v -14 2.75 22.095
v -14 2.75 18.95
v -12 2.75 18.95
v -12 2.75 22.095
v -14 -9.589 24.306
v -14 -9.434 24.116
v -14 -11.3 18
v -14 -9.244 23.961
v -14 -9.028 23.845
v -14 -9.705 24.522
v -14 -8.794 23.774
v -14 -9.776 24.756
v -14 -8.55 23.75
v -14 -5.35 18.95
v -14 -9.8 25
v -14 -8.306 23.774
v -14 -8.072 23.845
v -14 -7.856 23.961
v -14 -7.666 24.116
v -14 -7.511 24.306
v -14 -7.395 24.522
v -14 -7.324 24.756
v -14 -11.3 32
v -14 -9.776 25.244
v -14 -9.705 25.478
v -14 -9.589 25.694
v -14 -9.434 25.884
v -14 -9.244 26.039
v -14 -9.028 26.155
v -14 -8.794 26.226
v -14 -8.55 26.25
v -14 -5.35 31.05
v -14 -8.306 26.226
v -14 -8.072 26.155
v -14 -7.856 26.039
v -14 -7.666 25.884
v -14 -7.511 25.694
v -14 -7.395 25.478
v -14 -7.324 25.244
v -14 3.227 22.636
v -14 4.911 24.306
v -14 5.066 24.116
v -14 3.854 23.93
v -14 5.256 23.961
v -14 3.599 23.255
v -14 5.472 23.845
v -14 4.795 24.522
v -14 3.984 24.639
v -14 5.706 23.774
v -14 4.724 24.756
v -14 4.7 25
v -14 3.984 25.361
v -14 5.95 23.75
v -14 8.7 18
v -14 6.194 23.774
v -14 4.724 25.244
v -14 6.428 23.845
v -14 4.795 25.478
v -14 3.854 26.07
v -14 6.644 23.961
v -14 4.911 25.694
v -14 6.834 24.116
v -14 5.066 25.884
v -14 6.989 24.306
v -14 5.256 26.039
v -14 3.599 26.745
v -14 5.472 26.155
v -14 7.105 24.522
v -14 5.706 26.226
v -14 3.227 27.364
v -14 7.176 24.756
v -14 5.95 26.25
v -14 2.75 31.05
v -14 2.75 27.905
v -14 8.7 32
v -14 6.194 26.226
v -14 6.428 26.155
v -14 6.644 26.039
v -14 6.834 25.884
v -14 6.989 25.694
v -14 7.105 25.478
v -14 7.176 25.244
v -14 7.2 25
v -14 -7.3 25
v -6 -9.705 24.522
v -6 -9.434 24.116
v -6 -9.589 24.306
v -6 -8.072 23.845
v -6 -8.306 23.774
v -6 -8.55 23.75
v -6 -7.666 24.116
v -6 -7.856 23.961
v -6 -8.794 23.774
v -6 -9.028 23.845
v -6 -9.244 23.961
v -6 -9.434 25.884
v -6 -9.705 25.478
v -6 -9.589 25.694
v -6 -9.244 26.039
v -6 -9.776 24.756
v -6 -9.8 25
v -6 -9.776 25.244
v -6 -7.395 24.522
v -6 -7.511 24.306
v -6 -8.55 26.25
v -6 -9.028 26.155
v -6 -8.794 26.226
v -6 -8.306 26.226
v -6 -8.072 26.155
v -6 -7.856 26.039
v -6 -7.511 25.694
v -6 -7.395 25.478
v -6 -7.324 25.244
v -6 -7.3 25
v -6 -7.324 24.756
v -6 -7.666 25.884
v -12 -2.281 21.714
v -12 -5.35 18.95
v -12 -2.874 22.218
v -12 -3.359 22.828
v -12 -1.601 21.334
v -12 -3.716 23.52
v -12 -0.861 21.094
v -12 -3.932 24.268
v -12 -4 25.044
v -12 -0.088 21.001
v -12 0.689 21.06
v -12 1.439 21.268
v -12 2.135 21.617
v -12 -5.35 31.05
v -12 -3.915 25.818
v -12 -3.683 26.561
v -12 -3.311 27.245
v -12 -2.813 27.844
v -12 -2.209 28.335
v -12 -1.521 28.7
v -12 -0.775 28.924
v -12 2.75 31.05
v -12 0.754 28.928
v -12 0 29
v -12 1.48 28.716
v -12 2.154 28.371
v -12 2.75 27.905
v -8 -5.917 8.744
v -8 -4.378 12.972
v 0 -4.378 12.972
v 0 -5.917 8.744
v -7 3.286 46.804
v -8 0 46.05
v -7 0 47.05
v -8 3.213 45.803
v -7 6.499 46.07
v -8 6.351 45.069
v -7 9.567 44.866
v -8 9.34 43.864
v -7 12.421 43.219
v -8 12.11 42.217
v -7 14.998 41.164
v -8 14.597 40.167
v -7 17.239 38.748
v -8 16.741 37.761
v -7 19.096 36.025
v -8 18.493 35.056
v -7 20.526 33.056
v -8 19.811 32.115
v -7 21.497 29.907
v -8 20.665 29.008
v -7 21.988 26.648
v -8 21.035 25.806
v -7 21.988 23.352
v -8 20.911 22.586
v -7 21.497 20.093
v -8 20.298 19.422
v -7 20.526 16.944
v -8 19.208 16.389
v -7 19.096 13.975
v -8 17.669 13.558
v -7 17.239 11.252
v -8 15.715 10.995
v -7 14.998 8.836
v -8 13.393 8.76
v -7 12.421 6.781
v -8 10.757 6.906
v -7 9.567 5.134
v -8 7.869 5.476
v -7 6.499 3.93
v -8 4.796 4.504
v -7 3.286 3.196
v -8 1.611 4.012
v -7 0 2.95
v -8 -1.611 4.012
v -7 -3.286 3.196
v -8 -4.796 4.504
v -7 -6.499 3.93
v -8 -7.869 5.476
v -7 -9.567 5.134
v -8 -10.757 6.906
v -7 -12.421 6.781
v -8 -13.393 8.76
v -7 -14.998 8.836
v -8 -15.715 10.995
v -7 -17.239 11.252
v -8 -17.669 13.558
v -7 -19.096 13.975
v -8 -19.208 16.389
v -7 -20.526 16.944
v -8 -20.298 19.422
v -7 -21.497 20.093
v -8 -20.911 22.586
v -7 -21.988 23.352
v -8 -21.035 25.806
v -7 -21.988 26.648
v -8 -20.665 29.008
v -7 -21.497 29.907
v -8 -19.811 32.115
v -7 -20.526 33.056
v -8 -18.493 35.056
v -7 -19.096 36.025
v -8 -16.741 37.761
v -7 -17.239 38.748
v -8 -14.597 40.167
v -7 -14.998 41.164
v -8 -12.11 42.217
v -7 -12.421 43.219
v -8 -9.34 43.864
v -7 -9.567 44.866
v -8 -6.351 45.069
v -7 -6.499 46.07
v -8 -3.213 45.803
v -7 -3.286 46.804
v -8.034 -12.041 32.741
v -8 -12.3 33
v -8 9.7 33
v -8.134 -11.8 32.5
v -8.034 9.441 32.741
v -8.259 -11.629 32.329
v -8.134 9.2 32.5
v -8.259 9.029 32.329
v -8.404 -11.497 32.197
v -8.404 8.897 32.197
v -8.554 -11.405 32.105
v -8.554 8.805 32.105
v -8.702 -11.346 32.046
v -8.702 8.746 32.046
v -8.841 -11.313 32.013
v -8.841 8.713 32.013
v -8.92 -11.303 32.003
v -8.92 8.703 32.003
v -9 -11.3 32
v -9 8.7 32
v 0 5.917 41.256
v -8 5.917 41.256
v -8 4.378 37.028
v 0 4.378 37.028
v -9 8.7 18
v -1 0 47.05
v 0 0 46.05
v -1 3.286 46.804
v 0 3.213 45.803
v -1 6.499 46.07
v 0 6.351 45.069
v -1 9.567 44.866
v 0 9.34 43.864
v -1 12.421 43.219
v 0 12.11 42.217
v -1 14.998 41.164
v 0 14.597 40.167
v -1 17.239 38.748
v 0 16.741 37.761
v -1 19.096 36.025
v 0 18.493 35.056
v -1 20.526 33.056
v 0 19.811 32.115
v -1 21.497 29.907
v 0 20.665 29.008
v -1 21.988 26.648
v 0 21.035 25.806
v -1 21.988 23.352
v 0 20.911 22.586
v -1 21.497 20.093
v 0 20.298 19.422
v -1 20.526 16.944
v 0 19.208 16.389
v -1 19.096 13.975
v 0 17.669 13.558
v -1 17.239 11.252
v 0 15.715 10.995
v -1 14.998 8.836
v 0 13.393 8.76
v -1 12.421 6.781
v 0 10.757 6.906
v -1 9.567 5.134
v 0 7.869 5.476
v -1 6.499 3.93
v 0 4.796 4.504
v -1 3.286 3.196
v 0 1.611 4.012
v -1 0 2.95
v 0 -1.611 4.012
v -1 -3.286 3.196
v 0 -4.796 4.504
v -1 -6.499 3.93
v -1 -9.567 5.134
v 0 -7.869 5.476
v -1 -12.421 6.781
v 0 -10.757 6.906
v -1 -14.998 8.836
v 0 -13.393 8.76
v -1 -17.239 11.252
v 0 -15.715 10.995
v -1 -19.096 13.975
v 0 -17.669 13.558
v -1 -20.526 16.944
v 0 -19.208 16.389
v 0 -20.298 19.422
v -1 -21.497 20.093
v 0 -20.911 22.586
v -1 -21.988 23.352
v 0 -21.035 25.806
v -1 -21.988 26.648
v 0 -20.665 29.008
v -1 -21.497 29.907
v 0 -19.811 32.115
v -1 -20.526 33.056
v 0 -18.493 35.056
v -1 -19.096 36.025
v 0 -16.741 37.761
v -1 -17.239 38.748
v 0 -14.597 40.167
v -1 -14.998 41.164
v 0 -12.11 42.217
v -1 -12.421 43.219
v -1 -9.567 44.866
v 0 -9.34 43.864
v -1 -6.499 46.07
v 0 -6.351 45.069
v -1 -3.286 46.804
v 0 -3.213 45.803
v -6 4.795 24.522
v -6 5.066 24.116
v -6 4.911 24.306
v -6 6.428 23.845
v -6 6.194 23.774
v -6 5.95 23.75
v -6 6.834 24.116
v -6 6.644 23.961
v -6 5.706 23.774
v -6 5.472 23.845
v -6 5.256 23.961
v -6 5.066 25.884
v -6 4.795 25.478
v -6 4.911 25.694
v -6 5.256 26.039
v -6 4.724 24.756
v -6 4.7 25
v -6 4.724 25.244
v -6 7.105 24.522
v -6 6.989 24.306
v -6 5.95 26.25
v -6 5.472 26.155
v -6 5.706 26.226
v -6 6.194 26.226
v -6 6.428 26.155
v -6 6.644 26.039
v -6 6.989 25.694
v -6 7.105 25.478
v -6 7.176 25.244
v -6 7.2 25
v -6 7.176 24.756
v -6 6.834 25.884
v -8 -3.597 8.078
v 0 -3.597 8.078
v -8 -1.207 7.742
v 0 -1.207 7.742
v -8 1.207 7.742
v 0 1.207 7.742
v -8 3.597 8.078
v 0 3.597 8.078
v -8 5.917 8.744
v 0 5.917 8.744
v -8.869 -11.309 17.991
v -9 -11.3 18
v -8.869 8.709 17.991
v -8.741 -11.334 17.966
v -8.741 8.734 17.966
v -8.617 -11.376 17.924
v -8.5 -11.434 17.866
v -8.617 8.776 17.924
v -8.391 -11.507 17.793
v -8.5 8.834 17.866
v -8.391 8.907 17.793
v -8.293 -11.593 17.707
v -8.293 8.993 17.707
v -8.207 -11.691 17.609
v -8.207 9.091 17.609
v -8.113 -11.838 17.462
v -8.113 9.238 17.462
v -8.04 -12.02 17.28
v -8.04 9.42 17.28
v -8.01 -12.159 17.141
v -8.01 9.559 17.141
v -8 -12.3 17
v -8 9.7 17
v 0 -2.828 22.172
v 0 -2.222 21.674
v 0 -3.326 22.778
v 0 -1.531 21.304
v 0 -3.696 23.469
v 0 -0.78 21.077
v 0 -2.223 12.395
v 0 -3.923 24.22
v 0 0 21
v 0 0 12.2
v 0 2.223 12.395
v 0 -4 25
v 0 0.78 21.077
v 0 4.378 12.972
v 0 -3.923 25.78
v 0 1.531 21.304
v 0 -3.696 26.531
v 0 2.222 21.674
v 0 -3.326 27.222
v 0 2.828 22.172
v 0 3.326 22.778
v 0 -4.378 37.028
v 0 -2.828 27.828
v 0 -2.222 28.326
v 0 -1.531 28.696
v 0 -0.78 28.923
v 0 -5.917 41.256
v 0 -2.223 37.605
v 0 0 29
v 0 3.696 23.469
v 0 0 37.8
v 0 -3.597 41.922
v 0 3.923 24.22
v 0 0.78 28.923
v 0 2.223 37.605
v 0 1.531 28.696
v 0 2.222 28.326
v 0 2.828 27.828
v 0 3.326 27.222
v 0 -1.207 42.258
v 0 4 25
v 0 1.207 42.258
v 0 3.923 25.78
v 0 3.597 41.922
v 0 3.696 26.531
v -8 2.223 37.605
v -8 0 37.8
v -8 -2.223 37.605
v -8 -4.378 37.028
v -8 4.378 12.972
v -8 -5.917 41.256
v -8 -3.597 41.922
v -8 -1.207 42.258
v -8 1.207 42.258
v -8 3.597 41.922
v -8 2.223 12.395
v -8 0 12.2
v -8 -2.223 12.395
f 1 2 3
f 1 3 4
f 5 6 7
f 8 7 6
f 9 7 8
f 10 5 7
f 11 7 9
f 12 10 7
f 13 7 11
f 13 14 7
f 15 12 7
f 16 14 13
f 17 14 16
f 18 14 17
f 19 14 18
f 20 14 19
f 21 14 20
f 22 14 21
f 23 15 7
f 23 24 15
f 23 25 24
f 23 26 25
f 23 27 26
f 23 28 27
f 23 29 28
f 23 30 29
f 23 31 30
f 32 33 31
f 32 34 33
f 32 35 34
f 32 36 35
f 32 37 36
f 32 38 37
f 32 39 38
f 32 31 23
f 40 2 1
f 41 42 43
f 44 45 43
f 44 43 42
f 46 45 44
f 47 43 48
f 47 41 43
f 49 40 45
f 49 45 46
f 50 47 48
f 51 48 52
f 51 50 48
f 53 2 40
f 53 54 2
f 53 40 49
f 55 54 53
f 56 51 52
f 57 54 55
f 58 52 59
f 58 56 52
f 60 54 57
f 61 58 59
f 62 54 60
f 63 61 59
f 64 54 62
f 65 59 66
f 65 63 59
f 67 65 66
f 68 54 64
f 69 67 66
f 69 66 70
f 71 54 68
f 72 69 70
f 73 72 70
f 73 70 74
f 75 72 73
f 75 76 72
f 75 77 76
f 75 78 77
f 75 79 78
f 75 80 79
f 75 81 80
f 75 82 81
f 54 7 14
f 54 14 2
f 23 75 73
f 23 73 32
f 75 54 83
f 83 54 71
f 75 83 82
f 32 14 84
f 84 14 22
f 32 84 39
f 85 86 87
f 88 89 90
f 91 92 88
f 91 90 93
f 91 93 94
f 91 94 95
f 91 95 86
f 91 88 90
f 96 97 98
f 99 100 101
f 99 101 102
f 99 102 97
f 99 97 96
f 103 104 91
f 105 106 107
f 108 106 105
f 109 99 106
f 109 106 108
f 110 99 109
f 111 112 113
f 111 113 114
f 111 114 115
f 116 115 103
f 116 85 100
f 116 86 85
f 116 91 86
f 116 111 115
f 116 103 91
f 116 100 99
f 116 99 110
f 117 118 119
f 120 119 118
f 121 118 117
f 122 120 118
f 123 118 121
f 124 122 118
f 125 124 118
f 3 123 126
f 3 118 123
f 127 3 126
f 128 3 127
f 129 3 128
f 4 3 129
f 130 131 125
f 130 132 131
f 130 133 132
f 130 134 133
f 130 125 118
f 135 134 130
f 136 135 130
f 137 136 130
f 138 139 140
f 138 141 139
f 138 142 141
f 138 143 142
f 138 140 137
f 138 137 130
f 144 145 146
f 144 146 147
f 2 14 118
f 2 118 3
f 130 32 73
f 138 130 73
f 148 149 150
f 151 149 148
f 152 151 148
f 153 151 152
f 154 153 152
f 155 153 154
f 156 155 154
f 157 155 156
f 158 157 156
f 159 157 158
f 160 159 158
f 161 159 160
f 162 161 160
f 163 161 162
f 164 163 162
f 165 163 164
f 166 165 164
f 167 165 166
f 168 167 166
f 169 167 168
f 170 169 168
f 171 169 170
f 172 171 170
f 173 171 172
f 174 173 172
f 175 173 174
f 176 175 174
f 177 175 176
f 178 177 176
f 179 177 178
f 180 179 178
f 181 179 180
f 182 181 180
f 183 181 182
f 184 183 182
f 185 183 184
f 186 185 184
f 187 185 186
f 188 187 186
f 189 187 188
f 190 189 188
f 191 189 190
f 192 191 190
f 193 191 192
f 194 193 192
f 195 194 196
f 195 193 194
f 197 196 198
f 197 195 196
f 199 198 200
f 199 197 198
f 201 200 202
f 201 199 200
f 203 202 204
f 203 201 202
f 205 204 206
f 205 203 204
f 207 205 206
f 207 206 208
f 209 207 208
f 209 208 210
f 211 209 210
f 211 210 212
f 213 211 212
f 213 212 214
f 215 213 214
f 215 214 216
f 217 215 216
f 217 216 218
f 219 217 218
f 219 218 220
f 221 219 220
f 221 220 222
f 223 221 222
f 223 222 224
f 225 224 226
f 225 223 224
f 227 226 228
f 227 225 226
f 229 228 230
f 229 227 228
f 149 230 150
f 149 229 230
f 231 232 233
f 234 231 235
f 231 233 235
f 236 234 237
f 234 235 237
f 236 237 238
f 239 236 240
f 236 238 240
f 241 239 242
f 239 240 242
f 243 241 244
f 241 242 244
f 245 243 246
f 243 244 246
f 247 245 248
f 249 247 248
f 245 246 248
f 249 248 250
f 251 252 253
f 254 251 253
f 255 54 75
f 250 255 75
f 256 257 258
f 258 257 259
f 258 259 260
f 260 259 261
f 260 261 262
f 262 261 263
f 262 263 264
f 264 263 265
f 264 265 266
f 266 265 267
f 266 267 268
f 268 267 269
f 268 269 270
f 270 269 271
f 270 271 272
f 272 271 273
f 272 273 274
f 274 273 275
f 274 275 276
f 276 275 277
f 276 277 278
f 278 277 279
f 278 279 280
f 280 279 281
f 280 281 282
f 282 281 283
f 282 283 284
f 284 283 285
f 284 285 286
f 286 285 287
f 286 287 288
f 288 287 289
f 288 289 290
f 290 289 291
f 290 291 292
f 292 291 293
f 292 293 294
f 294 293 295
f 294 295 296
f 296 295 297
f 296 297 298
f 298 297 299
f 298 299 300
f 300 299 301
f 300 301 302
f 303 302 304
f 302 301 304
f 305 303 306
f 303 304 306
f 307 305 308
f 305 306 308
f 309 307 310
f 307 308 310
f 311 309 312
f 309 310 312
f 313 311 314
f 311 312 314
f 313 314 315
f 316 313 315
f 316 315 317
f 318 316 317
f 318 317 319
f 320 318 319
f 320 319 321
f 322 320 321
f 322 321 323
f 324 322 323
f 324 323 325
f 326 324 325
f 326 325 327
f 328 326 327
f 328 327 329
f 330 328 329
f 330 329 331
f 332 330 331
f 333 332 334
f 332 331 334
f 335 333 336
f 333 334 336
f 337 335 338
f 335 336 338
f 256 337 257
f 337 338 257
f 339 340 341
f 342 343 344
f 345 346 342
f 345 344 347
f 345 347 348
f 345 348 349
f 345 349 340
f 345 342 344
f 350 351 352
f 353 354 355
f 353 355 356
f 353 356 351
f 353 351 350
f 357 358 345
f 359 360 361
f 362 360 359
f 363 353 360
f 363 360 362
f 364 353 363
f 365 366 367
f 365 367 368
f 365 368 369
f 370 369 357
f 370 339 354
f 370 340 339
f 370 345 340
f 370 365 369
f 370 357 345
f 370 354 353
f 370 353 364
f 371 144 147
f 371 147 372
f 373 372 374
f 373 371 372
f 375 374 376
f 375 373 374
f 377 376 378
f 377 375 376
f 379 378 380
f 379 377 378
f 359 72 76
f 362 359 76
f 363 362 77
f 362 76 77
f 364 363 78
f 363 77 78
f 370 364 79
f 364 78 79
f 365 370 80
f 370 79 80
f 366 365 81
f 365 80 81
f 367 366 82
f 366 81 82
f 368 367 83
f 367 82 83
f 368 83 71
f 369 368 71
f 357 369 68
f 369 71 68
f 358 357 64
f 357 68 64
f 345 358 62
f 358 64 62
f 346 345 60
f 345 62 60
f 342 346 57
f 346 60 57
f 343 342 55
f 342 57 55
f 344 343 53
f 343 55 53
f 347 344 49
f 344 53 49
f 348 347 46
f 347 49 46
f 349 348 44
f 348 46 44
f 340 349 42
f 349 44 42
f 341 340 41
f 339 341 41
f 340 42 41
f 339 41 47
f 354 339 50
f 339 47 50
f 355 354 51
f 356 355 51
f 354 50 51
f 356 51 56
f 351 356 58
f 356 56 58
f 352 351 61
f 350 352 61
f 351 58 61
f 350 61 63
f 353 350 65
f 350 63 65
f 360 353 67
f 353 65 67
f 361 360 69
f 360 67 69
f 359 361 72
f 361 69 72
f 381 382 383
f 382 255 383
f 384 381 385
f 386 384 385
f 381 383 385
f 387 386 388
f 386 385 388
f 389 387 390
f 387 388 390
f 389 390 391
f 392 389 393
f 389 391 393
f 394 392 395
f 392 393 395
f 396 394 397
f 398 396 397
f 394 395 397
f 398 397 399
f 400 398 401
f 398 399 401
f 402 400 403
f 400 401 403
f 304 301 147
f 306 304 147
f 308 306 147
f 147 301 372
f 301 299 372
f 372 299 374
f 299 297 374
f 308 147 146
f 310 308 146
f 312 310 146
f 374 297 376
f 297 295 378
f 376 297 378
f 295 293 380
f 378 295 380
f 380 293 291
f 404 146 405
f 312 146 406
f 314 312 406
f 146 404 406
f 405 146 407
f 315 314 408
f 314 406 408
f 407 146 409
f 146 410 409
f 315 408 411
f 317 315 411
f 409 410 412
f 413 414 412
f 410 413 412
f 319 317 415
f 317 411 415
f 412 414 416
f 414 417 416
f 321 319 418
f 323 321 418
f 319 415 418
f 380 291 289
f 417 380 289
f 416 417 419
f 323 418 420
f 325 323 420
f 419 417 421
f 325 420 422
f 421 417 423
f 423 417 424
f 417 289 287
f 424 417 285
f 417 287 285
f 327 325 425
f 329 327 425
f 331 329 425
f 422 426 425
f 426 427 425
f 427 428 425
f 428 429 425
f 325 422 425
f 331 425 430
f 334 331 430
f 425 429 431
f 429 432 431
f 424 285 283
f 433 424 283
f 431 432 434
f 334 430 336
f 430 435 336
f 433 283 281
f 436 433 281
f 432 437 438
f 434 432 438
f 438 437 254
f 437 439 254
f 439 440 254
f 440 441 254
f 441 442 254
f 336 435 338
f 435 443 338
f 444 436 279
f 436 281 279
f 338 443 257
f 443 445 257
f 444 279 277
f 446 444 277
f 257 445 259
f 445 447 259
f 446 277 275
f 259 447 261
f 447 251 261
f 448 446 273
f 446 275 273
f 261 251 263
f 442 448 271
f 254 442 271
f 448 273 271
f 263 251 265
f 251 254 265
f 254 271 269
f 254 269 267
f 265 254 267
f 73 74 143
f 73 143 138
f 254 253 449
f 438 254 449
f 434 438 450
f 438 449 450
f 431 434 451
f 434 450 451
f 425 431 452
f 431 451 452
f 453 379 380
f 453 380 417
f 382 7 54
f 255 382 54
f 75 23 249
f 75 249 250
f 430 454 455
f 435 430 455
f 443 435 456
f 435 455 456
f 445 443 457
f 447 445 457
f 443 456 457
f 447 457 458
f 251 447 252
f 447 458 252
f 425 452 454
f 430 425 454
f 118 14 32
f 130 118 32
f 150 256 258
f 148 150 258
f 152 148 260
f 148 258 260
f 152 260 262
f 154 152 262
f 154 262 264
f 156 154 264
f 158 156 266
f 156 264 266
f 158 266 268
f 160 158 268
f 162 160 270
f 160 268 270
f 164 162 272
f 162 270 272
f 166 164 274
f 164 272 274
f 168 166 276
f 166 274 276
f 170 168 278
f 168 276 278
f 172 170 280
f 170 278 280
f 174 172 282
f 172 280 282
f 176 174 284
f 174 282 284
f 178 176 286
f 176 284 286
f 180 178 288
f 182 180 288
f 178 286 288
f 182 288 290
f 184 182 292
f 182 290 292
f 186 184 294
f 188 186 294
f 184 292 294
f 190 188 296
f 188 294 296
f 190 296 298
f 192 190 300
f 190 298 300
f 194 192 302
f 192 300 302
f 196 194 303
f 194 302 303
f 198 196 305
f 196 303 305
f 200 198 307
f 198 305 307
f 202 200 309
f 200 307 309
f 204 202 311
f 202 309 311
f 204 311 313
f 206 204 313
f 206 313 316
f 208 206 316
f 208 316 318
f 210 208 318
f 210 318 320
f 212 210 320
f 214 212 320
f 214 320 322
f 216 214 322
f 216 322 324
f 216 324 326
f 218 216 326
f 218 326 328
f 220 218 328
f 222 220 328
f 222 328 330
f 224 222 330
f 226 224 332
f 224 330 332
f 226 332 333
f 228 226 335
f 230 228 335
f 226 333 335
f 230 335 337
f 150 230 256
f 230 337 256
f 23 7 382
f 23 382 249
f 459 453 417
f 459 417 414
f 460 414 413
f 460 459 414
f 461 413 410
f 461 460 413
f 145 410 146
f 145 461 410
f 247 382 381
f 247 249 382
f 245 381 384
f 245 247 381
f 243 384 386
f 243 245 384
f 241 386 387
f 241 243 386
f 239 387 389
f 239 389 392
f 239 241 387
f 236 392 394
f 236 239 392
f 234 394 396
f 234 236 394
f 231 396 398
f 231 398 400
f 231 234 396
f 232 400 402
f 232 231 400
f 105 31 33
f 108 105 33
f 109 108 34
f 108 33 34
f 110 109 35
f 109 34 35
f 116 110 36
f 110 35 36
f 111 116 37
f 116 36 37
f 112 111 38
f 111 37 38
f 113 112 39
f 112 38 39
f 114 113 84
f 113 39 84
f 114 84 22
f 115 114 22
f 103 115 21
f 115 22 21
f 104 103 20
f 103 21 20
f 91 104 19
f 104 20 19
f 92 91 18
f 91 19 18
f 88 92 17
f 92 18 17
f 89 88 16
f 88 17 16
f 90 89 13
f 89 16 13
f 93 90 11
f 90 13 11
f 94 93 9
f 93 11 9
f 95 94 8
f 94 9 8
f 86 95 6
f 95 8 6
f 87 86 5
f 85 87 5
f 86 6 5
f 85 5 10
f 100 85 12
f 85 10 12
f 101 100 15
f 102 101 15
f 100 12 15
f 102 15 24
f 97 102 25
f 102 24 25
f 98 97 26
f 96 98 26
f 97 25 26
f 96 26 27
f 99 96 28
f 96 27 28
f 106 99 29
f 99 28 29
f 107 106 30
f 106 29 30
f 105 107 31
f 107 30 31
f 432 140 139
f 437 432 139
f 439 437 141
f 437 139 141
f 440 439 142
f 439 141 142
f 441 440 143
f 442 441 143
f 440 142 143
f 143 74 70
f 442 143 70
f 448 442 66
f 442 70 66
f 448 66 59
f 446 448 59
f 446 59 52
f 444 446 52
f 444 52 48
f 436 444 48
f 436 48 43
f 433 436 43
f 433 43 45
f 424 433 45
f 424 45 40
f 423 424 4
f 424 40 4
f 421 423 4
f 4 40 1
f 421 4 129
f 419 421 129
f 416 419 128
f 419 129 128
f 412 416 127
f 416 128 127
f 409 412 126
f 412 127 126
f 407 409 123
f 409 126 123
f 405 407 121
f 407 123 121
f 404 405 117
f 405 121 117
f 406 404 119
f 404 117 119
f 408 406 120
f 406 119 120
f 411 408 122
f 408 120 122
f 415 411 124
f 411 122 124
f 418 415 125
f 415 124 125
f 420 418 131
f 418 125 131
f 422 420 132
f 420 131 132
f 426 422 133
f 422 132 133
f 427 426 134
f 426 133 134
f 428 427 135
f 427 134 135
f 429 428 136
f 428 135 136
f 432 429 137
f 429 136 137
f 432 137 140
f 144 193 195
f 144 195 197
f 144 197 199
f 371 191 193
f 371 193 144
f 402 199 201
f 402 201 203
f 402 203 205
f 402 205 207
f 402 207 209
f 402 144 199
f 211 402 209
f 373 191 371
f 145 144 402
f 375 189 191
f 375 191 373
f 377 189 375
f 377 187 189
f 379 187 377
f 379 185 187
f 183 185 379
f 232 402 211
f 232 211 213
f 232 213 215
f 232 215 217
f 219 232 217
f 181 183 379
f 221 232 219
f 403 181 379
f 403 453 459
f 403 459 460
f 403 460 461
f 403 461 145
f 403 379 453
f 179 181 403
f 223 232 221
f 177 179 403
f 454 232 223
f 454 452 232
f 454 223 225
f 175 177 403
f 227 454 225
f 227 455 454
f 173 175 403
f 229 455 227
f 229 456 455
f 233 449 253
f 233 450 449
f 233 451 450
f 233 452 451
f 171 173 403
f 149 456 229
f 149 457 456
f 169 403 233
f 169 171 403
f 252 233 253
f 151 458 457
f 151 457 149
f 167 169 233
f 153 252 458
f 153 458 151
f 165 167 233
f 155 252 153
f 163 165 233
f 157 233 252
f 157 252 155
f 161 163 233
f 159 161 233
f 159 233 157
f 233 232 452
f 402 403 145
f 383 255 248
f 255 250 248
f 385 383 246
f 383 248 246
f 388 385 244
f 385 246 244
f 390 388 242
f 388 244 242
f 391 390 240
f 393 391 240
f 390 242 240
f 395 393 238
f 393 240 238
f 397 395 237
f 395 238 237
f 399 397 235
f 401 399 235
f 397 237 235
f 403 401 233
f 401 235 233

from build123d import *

# Parameters (mm, degrees)
SKETCH1_R           = 22.05
BOSS_EXTRUDE1_DEPTH = 8
CUT_EXTRUDE1_REACH  = 54.573
SKETCH2_R           = 4
CUT_EXTRUDE2_REACH  = 54.573
FILLET1_SIZE        = 1
BOSS_EXTRUDE2_START = 6
SKETCH4_W           = 14
SKETCH4_H           = 20
SKETCH4_R           = 4
BOSS_EXTRUDE2_DEPTH = 6
SKETCH6_W           = 12.1
SKETCH6_H           = 8.1
CUT_EXTRUDE3_DEPTH  = 2
SKETCH7_R           = 1.25
CUT_EXTRUDE4_DEPTH  = 8
FILLET2_R           = 1


with BuildPart() as part:
    # Sketch1 → Boss-Extrude1 (new body)
    with BuildSketch(Plane.ZY):
        with Locations((25, 0)):
            Circle(SKETCH1_R)
    extrude(amount=BOSS_EXTRUDE1_DEPTH)

    # Sketch2 → Cut-Extrude1 (cut, up to next)
    with BuildSketch(Plane.ZY.offset(8), mode=Mode.PRIVATE) as cut_extrude1_sk1:
        with Locations((25, 0)):
            Circle(SKETCH2_R)
    cut_extrude1_tool1 = extrude(cut_extrude1_sk1.sketch, amount=-CUT_EXTRUDE1_REACH, mode=Mode.PRIVATE) & part.part
    add(cut_extrude1_tool1.solids().sort_by_distance((-8, 0, 25))[0], mode=Mode.SUBTRACT)

    # Sketch3 → Cut-Extrude2 (cut, up to next)
    with BuildSketch(Plane.ZY.offset(8), mode=Mode.PRIVATE) as cut_extrude2_sk1:
        with BuildLine():
            Line((12.972134752, -4.377784932), (8.743517959, -5.916875577))
            ThreePointArc((8.743517959, -5.916875577), (7.700213153, 0), (8.743517959, 5.916875577))
            Line((8.743517959, 5.916875577), (12.972134752, 4.377784932))
            ThreePointArc((12.972134752, 4.377784932), (12.200213153, 0), (12.972134752, -4.377784932))
        make_face()
    cut_extrude2_tool1 = extrude(cut_extrude2_sk1.sketch, amount=-CUT_EXTRUDE2_REACH, mode=Mode.PRIVATE) & part.part
    # Sketch3 → Cut-Extrude2 (cut, up to next)
    with BuildSketch(Plane.ZY.offset(8), mode=Mode.PRIVATE) as cut_extrude2_sk2:
        with BuildLine():
            Line((37.027865248, -4.377784932), (41.256482041, -5.916875577))
            ThreePointArc((41.256482041, -5.916875577), (42.299786847, 0), (41.256482041, 5.916875577))
            Line((41.256482041, 5.916875577), (37.027865248, 4.377784932))
            ThreePointArc((37.027865248, 4.377784932), (37.799786847, 0), (37.027865248, -4.377784932))
        make_face()
    cut_extrude2_tool2 = extrude(cut_extrude2_sk2.sketch, amount=-CUT_EXTRUDE2_REACH, mode=Mode.PRIVATE) & part.part
    add(cut_extrude2_tool1.solids().sort_by_distance((-8, 0, 10.14412))[0], mode=Mode.SUBTRACT)
    add(cut_extrude2_tool2.solids().sort_by_distance((-8, 0, 39.85588))[0], mode=Mode.SUBTRACT)

    # Fillet1
    fillet1_edges = [part.edges().sort_by_distance(p)[0] for p in [
        (0, 0, 2.95),
        (-8, 0, 2.95),
    ]]
    chamfer(fillet1_edges, length=FILLET1_SIZE)

    # Sketch4 → Boss-Extrude2 (add)
    with BuildSketch(Plane.ZY.offset(8).offset(BOSS_EXTRUDE2_START)):
        with Locations((25, -1.3)):
            Rectangle(SKETCH4_W, SKETCH4_H)
        with Locations((25, 0)):
            Circle(SKETCH4_R, mode=Mode.SUBTRACT)
    extrude(amount=-BOSS_EXTRUDE2_DEPTH)

    # Sketch6 → Cut-Extrude3 (cut)
    with BuildSketch(Plane.ZY.offset(14)):
        with Locations((25, -1.3)):
            Rectangle(SKETCH6_W, SKETCH6_H)
    extrude(amount=-CUT_EXTRUDE3_DEPTH, mode=Mode.SUBTRACT)

    # Sketch7 → Cut-Extrude4 (cut)
    with BuildSketch(Plane.ZY.offset(14)):
        with Locations((25, 5.95)):
            Circle(SKETCH7_R)
        with Locations((25, -8.55)):
            Circle(SKETCH7_R)
    extrude(amount=-CUT_EXTRUDE4_DEPTH, mode=Mode.SUBTRACT)

    # Fillet2
    fillet2_edges = [part.edges().sort_by_distance(p)[0] for p in [
        (-8, -1.3, 32),
        (-8, 8.7, 25),
        (-8, -1.3, 18),
        (-8, -11.3, 25),
    ]]
    fillet(fillet2_edges, radius=FILLET2_R)


solid = part.part
